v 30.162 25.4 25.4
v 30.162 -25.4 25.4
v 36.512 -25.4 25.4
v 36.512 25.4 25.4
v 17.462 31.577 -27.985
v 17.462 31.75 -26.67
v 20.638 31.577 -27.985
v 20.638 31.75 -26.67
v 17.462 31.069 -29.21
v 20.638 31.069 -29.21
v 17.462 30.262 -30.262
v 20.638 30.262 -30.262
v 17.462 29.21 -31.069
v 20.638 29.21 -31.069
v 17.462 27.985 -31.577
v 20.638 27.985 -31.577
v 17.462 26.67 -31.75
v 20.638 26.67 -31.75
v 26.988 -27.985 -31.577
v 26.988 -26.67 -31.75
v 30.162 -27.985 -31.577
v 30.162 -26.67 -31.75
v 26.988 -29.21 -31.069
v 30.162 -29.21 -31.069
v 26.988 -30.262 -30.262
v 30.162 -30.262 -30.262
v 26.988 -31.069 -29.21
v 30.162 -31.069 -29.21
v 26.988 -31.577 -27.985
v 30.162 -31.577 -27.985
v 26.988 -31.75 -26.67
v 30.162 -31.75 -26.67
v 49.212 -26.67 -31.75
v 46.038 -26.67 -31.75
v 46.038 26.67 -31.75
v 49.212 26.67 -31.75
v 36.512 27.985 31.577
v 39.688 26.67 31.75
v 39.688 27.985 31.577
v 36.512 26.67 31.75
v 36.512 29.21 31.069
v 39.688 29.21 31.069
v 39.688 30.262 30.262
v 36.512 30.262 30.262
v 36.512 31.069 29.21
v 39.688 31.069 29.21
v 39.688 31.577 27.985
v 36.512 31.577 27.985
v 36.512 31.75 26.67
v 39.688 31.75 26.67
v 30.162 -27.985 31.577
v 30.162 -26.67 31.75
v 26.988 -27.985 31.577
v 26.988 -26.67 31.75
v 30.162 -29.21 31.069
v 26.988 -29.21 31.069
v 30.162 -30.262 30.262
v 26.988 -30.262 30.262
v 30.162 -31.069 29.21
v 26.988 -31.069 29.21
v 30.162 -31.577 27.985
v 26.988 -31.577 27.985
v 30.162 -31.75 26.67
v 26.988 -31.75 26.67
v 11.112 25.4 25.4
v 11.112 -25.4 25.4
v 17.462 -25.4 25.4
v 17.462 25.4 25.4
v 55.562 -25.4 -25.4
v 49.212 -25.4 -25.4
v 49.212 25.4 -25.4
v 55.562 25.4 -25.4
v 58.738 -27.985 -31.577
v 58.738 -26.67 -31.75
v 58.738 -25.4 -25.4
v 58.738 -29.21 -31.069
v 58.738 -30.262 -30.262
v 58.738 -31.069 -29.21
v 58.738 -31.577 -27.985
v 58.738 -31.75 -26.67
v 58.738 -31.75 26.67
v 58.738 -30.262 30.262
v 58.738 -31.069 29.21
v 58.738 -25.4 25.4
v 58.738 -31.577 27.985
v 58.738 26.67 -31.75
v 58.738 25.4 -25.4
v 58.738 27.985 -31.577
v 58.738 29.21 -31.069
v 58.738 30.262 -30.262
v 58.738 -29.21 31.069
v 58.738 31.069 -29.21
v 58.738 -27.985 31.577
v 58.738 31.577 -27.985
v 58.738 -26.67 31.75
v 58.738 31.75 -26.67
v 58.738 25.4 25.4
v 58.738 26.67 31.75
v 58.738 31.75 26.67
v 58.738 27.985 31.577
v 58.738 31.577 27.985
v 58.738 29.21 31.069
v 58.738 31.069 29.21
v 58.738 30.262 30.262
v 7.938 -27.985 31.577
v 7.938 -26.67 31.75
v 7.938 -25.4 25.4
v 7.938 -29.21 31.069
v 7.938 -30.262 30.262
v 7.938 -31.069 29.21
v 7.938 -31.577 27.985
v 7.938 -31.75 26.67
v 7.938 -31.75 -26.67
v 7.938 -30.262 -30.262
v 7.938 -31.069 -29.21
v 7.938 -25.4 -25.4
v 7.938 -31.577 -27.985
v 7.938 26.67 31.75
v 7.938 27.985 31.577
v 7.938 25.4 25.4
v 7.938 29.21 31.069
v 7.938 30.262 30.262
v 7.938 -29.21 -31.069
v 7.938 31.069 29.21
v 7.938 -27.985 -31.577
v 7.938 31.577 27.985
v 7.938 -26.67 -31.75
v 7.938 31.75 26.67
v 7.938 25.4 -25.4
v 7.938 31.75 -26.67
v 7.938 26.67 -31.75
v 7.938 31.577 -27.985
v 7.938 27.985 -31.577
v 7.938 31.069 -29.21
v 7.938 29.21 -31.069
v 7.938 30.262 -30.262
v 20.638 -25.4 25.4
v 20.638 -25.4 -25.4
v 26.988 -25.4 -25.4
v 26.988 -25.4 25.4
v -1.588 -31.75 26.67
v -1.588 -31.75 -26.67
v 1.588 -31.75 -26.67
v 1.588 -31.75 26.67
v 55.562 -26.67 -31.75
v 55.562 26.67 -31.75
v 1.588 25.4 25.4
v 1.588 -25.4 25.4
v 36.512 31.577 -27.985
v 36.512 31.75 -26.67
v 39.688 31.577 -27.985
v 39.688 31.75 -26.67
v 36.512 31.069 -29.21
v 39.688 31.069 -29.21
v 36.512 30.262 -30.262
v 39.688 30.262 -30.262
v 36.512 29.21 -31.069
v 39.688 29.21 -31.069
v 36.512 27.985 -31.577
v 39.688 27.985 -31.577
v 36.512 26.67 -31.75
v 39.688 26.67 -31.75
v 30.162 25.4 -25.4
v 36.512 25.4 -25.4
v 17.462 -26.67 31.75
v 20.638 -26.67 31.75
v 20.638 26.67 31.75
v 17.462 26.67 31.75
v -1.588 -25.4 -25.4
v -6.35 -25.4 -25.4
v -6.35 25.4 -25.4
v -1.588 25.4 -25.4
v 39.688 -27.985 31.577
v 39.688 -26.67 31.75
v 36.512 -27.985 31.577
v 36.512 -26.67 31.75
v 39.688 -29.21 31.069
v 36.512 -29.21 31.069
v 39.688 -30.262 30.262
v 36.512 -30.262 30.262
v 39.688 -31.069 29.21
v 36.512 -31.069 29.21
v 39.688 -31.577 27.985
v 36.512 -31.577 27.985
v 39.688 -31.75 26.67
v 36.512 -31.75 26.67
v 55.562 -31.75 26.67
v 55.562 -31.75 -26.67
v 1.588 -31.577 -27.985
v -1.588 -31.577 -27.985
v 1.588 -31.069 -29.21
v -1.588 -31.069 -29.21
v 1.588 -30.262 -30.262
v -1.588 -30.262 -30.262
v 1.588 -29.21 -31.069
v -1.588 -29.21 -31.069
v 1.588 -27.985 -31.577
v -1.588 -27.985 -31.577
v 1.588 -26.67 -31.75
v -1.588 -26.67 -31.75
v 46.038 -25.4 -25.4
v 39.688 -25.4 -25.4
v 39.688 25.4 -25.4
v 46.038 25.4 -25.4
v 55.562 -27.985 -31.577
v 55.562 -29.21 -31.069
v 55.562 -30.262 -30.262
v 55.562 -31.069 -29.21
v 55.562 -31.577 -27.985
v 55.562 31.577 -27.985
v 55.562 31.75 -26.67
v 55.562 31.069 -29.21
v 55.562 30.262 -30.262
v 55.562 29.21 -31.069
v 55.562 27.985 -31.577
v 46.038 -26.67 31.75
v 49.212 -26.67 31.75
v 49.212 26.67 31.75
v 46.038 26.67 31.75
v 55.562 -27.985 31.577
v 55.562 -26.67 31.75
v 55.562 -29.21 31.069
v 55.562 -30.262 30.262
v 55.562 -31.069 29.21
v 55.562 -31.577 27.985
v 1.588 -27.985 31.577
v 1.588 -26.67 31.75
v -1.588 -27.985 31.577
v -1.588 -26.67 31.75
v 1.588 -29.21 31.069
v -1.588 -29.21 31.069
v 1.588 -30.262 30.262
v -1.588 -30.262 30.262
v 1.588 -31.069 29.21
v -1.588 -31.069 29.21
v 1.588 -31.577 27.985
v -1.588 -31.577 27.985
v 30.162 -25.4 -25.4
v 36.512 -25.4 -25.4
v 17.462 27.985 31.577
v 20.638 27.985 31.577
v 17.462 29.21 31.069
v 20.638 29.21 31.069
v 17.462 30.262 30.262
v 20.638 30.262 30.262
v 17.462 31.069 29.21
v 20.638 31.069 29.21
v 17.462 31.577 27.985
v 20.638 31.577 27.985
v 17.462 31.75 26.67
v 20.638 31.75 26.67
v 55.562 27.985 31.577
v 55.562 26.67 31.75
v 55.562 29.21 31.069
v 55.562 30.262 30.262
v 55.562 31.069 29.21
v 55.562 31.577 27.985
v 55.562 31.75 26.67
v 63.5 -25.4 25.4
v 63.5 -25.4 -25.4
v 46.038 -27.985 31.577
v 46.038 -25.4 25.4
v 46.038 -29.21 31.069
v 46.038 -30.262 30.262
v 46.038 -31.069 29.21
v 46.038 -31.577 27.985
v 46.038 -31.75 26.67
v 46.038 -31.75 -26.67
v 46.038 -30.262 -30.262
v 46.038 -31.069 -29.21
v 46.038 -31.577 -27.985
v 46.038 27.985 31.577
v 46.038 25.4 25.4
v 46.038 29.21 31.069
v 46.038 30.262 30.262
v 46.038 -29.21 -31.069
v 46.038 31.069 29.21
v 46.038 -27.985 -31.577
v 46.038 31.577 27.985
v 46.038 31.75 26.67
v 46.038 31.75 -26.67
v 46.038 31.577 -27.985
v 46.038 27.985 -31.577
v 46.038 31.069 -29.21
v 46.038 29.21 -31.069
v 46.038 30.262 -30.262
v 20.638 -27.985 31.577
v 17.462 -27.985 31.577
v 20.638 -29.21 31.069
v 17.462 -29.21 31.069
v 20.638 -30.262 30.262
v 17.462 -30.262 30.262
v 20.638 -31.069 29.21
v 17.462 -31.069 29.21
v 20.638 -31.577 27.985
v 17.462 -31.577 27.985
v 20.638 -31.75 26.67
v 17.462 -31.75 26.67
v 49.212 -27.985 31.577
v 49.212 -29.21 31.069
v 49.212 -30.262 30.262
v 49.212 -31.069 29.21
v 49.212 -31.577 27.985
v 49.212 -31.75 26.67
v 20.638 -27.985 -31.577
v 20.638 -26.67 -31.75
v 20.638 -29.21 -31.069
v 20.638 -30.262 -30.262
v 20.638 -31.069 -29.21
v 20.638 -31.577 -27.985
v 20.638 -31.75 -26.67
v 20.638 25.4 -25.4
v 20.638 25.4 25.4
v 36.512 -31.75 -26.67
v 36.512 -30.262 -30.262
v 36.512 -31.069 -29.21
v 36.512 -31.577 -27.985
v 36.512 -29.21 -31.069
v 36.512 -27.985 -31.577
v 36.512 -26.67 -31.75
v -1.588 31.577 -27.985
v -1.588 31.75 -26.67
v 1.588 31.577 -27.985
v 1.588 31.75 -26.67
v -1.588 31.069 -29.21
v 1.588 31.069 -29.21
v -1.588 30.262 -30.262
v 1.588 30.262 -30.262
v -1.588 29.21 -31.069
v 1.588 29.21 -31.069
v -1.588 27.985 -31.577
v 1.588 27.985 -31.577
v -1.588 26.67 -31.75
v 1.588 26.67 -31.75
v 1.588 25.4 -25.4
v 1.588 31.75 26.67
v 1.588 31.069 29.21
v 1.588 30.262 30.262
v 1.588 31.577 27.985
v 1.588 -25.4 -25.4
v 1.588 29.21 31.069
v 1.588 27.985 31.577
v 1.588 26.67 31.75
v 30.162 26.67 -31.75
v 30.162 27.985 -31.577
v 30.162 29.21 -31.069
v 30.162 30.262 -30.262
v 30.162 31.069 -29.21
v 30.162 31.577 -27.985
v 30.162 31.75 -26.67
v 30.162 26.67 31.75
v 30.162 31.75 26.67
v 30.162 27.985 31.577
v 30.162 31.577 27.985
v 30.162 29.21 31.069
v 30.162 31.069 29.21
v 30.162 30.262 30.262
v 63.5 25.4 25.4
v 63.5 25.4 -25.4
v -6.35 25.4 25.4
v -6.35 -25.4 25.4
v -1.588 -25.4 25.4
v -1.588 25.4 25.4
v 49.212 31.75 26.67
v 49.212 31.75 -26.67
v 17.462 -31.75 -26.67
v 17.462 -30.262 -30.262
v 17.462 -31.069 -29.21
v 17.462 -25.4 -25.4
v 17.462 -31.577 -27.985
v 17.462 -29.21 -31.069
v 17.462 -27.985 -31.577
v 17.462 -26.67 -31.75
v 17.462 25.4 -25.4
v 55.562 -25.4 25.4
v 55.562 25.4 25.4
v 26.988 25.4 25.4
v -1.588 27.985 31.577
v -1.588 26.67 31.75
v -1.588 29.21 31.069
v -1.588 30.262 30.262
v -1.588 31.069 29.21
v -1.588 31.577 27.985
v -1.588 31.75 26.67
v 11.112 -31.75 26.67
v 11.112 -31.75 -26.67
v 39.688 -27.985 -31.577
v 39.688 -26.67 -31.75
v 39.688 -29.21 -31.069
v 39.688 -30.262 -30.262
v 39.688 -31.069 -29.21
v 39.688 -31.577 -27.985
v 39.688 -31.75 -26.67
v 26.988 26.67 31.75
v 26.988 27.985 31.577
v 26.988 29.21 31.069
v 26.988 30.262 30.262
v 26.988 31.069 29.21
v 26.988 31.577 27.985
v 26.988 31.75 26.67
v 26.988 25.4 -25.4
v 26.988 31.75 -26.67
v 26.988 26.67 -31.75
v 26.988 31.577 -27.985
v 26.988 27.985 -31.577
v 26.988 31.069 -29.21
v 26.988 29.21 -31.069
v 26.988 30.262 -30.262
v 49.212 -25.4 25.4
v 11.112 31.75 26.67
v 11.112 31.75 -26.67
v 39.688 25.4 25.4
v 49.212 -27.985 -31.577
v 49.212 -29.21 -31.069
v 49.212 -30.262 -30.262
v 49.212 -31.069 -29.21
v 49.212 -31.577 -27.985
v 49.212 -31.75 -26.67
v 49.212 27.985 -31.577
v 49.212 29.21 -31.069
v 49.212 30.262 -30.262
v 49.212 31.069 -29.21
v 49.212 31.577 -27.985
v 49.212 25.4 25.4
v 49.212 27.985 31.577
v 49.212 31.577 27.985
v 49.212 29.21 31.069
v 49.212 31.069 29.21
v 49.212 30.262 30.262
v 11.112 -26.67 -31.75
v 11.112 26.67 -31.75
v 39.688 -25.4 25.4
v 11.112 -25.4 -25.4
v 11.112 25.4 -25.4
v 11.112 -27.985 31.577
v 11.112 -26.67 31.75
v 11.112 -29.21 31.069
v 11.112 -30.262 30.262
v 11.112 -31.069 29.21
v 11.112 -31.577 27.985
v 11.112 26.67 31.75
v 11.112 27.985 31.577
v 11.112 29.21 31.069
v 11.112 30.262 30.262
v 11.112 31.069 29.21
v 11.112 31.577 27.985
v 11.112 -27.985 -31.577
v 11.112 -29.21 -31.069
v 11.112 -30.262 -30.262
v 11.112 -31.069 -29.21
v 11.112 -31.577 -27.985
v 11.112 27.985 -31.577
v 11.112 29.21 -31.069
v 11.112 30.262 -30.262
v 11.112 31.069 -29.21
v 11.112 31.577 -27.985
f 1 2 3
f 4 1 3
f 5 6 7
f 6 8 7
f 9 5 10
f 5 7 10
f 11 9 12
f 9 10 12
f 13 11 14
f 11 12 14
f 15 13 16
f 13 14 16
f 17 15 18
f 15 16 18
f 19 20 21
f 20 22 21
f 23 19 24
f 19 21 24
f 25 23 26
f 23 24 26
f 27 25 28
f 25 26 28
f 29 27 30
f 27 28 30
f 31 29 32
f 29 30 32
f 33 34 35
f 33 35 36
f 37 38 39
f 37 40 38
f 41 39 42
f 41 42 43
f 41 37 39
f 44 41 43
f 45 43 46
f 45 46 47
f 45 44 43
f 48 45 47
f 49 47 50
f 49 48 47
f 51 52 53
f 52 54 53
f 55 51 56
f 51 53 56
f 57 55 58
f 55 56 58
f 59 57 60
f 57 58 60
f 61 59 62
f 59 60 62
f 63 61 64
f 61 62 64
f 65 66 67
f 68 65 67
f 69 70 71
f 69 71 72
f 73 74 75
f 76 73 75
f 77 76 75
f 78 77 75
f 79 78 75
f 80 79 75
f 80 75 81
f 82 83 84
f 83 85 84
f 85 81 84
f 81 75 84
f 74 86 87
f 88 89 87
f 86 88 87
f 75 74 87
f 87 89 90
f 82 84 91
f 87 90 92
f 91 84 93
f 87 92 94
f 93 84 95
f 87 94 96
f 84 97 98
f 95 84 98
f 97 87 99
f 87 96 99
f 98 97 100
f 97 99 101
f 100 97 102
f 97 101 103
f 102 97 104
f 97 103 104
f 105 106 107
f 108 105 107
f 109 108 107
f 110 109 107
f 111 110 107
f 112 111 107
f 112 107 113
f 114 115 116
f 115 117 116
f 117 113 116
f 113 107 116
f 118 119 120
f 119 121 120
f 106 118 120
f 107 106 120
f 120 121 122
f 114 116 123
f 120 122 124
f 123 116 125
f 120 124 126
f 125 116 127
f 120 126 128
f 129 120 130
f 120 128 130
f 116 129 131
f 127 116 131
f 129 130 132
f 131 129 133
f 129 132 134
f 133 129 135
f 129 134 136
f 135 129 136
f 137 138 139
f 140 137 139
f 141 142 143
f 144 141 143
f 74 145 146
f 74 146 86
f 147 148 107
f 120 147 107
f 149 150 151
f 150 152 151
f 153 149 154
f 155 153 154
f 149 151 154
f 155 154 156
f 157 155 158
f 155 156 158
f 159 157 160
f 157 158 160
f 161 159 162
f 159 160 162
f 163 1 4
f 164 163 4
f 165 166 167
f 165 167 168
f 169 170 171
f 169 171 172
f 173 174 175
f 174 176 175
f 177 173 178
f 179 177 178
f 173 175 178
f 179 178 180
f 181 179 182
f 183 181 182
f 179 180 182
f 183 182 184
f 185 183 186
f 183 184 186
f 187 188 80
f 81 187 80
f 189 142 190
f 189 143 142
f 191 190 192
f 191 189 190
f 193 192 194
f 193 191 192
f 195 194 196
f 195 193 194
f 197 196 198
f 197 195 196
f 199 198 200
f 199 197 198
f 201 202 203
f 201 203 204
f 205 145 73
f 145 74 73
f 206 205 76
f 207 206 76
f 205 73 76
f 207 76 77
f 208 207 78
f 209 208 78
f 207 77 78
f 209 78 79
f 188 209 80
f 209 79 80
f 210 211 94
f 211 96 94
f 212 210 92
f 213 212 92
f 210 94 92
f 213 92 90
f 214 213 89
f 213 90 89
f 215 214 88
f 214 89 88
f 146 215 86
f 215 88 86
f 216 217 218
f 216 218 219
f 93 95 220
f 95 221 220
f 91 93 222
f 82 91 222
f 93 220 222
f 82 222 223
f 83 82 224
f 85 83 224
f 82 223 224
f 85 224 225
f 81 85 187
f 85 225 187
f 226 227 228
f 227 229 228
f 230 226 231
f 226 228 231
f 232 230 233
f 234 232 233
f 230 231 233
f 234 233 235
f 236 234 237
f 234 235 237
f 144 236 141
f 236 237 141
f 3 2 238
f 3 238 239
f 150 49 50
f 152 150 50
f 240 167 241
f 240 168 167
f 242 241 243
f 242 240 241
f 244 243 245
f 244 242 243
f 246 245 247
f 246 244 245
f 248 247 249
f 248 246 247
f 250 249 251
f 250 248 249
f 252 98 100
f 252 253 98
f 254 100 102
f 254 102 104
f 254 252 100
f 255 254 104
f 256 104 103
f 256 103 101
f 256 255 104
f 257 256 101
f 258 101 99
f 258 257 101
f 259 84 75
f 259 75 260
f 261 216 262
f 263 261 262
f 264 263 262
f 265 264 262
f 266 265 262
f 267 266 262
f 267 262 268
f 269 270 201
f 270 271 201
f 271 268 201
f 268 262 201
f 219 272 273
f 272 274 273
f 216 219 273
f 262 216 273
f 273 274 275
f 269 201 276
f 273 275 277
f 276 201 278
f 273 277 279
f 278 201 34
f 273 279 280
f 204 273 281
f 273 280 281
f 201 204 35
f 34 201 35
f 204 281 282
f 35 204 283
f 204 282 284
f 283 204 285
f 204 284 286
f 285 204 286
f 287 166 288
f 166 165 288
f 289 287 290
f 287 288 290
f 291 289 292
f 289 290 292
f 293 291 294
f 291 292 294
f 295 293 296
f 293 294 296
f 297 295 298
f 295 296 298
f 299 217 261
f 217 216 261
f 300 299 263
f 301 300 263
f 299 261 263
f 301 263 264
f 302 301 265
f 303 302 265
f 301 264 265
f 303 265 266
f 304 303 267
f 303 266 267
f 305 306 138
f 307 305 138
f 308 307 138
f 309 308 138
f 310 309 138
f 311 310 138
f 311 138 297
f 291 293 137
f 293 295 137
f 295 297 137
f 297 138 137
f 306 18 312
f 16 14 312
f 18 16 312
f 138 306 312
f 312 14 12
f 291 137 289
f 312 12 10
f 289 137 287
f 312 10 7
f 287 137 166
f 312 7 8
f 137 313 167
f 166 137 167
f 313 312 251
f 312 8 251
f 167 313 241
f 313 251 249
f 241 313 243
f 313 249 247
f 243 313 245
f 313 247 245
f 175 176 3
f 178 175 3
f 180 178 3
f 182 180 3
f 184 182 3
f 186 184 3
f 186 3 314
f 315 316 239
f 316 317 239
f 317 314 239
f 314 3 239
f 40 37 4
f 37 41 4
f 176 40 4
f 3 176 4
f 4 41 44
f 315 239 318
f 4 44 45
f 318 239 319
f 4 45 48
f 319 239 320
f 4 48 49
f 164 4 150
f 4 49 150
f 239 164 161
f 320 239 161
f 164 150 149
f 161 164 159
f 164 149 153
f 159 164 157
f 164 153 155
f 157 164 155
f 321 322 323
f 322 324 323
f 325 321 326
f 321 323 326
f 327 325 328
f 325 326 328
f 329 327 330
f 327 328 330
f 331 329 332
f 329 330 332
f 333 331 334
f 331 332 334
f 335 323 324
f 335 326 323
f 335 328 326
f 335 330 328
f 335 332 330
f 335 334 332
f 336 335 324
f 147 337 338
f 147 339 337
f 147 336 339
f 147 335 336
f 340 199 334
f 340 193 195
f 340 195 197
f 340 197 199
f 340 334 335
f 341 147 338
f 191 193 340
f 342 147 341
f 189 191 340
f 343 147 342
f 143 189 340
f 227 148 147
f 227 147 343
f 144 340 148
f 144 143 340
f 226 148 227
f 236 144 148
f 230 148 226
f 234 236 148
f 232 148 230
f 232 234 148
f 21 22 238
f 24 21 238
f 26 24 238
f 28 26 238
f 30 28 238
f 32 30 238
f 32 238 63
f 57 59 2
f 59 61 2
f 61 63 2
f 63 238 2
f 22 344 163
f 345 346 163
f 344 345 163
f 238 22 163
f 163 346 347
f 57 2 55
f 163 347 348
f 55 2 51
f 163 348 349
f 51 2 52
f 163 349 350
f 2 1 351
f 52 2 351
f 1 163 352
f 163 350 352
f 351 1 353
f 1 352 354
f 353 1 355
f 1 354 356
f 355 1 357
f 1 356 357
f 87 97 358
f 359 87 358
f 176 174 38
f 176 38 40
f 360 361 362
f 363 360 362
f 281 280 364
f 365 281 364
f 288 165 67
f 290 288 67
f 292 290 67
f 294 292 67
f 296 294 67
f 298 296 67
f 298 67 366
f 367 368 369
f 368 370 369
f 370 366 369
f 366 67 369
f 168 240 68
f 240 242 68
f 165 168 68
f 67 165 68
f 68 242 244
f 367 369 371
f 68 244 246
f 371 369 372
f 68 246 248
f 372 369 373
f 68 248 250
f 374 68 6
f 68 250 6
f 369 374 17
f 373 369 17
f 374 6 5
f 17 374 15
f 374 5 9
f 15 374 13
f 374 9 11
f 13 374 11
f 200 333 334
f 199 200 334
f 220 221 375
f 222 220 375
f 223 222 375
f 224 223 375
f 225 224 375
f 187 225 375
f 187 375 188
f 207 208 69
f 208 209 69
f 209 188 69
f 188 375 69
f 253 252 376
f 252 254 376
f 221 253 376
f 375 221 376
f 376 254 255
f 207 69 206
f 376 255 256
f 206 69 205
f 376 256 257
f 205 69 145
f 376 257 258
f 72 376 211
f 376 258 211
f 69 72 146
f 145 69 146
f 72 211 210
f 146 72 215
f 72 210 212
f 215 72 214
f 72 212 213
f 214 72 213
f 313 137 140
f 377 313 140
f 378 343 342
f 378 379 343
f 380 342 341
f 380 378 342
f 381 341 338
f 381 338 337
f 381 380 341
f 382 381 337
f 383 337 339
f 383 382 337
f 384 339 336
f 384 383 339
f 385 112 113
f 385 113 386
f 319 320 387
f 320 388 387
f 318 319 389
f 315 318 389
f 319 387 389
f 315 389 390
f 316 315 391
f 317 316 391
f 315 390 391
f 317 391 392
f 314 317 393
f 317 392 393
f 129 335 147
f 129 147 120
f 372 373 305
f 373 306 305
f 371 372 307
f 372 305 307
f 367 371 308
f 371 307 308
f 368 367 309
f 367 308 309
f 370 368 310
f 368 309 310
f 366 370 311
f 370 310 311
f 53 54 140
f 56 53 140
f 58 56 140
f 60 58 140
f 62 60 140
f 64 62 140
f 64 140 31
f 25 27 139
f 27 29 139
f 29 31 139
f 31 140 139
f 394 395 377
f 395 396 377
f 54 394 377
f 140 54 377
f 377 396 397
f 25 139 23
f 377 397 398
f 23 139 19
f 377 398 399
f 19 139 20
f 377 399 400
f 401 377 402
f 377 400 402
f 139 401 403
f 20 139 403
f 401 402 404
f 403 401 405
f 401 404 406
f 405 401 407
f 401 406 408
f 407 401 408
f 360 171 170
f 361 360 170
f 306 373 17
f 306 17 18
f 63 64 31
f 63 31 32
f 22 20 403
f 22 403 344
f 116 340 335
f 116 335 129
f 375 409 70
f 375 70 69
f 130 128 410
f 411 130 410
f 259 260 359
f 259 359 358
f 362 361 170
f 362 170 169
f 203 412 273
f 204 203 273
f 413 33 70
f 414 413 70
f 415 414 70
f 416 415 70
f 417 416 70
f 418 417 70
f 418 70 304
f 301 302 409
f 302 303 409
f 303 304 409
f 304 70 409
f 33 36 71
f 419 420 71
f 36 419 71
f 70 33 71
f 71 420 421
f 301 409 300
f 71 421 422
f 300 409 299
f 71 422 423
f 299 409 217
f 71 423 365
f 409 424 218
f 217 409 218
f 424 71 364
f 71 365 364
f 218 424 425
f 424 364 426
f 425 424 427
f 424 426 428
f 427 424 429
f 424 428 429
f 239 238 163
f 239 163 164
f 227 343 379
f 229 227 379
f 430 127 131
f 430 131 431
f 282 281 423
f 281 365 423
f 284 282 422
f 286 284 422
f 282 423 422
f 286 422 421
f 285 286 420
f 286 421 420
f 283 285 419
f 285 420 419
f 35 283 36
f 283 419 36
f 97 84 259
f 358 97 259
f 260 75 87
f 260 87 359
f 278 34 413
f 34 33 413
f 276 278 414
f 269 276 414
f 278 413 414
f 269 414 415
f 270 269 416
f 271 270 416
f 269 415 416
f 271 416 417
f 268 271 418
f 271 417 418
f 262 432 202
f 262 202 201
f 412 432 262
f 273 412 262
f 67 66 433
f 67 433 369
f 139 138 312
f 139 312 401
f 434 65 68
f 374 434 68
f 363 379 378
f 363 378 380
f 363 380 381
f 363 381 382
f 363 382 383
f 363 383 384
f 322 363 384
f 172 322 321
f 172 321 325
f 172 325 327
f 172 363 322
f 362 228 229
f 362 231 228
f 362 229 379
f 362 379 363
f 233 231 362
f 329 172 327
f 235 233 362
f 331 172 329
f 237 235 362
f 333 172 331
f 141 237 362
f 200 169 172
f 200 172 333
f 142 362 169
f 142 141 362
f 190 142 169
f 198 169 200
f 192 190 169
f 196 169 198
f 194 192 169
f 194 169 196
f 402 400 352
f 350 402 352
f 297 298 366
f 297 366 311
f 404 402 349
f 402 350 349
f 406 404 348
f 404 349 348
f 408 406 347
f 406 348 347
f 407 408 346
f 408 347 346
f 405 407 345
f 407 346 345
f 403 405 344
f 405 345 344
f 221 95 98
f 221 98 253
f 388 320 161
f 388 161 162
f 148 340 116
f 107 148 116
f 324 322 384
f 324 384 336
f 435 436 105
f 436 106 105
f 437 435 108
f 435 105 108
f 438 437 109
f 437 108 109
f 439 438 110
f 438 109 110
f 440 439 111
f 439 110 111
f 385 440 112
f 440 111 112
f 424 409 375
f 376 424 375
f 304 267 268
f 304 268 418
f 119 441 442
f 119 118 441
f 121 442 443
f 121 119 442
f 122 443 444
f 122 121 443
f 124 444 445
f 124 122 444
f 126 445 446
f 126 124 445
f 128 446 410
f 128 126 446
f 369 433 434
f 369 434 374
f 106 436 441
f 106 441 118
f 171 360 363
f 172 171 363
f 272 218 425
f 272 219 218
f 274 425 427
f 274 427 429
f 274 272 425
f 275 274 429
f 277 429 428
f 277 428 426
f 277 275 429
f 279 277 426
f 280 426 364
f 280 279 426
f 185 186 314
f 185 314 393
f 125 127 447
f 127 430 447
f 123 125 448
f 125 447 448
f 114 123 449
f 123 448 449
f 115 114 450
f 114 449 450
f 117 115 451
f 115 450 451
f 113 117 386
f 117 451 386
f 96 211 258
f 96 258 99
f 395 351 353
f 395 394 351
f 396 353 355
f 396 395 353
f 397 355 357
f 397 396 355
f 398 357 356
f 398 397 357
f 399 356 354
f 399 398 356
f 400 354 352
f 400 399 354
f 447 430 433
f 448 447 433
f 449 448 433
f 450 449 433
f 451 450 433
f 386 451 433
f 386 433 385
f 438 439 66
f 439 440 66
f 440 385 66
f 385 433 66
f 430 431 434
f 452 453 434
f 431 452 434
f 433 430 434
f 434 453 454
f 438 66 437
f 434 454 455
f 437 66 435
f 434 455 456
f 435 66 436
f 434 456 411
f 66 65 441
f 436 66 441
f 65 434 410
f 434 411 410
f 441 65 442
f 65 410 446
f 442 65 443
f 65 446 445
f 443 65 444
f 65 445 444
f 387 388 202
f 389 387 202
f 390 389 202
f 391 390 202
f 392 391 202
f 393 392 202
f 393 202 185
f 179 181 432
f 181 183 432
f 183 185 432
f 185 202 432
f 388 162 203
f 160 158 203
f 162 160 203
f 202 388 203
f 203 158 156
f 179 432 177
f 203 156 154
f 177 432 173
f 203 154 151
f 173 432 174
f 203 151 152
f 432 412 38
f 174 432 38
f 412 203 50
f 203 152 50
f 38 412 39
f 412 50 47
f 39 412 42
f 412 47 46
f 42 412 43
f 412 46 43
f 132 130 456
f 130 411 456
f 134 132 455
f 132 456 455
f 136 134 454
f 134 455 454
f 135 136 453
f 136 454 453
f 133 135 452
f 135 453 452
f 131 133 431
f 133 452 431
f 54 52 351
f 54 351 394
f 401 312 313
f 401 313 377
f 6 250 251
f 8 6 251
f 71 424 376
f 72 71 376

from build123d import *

# Parameters (mm, degrees)
F0_W      = 127
F0_H      = 50.8
F1_DEPTH  = 25.4
F3_DEPTH  = 31.75
F4_R      = 5.08
F5_R      = 5.08
F6_R      = 5.08
F7_R      = 5.08
F9_DEPTH  = 25.4
F8_W      = 57.15
F8_H      = 25.4
F10_DEPTH = 25.4
F11_W     = 57.15
F11_H     = 25.4
F12_DEPTH = 25.4
F13_DEPTH = 25.4
F14_R     = 5.08


with BuildPart() as f1:
    # F0 (on Front) → F1 (new body, symmetric)
    with BuildSketch(Plane.XZ):
        Rectangle(F0_W, F0_H)
    extrude(amount=F1_DEPTH, both=True)

    # F2 (on Front) → F3 (join, symmetric)
    with BuildSketch(Plane.XZ):
        Polygon((55.5625, 31.75), (55.5625, 0), (55.5625, -31.75), (58.7375, -31.75), (58.7375, 31.75), align=None)
        Polygon((46.0375, 31.75), (46.0375, 0), (47.625, 0), (49.2125, 0), (49.2125, 31.75), align=None)
        Polygon((36.5125, 31.75), (36.5125, 0), (38.1, 0), (39.6875, 0), (39.6875, 31.75), align=None)
        Polygon((26.9875, 31.75), (26.9875, 0), (28.575, 0), (30.1625, 0), (30.1625, 31.75), align=None)
        Polygon((17.4625, 31.75), (17.4625, 0), (19.05, 0), (20.6375, 0), (20.6375, 31.75), align=None)
        Polygon((7.9375, 31.75), (7.9375, 0), (9.525, 0), (11.1125, 0), (11.1125, 31.75), align=None)
        Polygon((1.5875, 31.75), (-1.5875, 31.75), (-1.5875, -31.75), (1.5875, -31.75), (1.5875, 0), align=None)
        Polygon((9.525, 0), (7.9375, 0), (7.9375, -31.75), (11.1125, -31.75), (11.1125, 0), align=None)
        Polygon((19.05, 0), (17.4625, 0), (17.4625, -31.75), (20.6375, -31.75), (20.6375, 0), align=None)
        Polygon((28.575, 0), (26.9875, 0), (26.9875, -31.75), (30.1625, -31.75), (30.1625, 0), align=None)
        Polygon((38.1, 0), (36.5125, 0), (36.5125, -31.75), (39.6875, -31.75), (39.6875, 0), align=None)
        Polygon((47.625, 0), (46.0375, 0), (46.0375, -31.75), (49.2125, -31.75), (49.2125, 0), align=None)
    extrude(amount=F3_DEPTH, both=True)

    # F4
    f4_edges = [f1.edges().sort_by_distance(p)[0] for p in [
        (0, -31.75, 31.75),
        (9.525, -31.75, 31.75),
        (19.05, -31.75, 31.75),
        (28.575, -31.75, 31.75),
        (38.1, -31.75, 31.75),
        (47.625, -31.75, 31.75),
        (57.15, -31.75, 31.75),
    ]]
    fillet(f4_edges, radius=F4_R)

    # F5
    f5_edges = [f1.edges().sort_by_distance(p)[0] for p in [
        (0, 31.75, 31.75),
        (9.525, 31.75, 31.75),
        (19.05, 31.75, 31.75),
        (28.575, 31.75, 31.75),
        (38.1, 31.75, 31.75),
        (47.625, 31.75, 31.75),
        (57.15, 31.75, 31.75),
    ]]
    fillet(f5_edges, radius=F5_R)

    # F6
    f6_edges = [f1.edges().sort_by_distance(p)[0] for p in [
        (57.15, 31.75, -31.75),
        (47.625, 31.75, -31.75),
        (38.1, 31.75, -31.75),
        (19.05, 31.75, -31.75),
        (28.575, 31.75, -31.75),
        (9.525, 31.75, -31.75),
        (0, 31.75, -31.75),
    ]]
    fillet(f6_edges, radius=F6_R)

    # F7
    f7_edges = [f1.edges().sort_by_distance(p)[0] for p in [
        (9.525, -31.75, -31.75),
        (19.05, -31.75, -31.75),
        (28.575, -31.75, -31.75),
        (38.1, -31.75, -31.75),
        (47.625, -31.75, -31.75),
        (57.15, -31.75, -31.75),
    ]]
    fillet(f7_edges, radius=F7_R)

    # F9 (cut): a face of the model
    f9_faces = [f1.faces().sort_by_distance(p)[0] for p in [
        (-32.54375, 0, 25.4),
    ]]
    extrude(f9_faces, amount=-F9_DEPTH, mode=Mode.SUBTRACT)

    # F8 (on Top) → F10 (cut)
    with BuildSketch(Plane.XY):
        with Locations((-34.925, 12.7)):
            Rectangle(F8_W, F8_H)
    extrude(amount=-F10_DEPTH, mode=Mode.SUBTRACT)

    # F11 (on Top) → F12 (cut)
    with BuildSketch(Plane.XY):
        with Locations((-34.925, -12.7)):
            Rectangle(F11_W, F11_H)
    extrude(amount=-F12_DEPTH, mode=Mode.SUBTRACT)

    # F13 (add): a face of the model
    f13_faces = [f1.faces().sort_by_distance(p)[0] for p in [
        (-3.96875, 0, 0),
    ]]
    extrude(f13_faces, amount=F13_DEPTH)

    # F14
    f14_edges = [f1.edges().sort_by_distance(p)[0] for p in [
        (0, -31.75, -31.75),
    ]]
    fillet(f14_edges, radius=F14_R)


solid = f1.part
